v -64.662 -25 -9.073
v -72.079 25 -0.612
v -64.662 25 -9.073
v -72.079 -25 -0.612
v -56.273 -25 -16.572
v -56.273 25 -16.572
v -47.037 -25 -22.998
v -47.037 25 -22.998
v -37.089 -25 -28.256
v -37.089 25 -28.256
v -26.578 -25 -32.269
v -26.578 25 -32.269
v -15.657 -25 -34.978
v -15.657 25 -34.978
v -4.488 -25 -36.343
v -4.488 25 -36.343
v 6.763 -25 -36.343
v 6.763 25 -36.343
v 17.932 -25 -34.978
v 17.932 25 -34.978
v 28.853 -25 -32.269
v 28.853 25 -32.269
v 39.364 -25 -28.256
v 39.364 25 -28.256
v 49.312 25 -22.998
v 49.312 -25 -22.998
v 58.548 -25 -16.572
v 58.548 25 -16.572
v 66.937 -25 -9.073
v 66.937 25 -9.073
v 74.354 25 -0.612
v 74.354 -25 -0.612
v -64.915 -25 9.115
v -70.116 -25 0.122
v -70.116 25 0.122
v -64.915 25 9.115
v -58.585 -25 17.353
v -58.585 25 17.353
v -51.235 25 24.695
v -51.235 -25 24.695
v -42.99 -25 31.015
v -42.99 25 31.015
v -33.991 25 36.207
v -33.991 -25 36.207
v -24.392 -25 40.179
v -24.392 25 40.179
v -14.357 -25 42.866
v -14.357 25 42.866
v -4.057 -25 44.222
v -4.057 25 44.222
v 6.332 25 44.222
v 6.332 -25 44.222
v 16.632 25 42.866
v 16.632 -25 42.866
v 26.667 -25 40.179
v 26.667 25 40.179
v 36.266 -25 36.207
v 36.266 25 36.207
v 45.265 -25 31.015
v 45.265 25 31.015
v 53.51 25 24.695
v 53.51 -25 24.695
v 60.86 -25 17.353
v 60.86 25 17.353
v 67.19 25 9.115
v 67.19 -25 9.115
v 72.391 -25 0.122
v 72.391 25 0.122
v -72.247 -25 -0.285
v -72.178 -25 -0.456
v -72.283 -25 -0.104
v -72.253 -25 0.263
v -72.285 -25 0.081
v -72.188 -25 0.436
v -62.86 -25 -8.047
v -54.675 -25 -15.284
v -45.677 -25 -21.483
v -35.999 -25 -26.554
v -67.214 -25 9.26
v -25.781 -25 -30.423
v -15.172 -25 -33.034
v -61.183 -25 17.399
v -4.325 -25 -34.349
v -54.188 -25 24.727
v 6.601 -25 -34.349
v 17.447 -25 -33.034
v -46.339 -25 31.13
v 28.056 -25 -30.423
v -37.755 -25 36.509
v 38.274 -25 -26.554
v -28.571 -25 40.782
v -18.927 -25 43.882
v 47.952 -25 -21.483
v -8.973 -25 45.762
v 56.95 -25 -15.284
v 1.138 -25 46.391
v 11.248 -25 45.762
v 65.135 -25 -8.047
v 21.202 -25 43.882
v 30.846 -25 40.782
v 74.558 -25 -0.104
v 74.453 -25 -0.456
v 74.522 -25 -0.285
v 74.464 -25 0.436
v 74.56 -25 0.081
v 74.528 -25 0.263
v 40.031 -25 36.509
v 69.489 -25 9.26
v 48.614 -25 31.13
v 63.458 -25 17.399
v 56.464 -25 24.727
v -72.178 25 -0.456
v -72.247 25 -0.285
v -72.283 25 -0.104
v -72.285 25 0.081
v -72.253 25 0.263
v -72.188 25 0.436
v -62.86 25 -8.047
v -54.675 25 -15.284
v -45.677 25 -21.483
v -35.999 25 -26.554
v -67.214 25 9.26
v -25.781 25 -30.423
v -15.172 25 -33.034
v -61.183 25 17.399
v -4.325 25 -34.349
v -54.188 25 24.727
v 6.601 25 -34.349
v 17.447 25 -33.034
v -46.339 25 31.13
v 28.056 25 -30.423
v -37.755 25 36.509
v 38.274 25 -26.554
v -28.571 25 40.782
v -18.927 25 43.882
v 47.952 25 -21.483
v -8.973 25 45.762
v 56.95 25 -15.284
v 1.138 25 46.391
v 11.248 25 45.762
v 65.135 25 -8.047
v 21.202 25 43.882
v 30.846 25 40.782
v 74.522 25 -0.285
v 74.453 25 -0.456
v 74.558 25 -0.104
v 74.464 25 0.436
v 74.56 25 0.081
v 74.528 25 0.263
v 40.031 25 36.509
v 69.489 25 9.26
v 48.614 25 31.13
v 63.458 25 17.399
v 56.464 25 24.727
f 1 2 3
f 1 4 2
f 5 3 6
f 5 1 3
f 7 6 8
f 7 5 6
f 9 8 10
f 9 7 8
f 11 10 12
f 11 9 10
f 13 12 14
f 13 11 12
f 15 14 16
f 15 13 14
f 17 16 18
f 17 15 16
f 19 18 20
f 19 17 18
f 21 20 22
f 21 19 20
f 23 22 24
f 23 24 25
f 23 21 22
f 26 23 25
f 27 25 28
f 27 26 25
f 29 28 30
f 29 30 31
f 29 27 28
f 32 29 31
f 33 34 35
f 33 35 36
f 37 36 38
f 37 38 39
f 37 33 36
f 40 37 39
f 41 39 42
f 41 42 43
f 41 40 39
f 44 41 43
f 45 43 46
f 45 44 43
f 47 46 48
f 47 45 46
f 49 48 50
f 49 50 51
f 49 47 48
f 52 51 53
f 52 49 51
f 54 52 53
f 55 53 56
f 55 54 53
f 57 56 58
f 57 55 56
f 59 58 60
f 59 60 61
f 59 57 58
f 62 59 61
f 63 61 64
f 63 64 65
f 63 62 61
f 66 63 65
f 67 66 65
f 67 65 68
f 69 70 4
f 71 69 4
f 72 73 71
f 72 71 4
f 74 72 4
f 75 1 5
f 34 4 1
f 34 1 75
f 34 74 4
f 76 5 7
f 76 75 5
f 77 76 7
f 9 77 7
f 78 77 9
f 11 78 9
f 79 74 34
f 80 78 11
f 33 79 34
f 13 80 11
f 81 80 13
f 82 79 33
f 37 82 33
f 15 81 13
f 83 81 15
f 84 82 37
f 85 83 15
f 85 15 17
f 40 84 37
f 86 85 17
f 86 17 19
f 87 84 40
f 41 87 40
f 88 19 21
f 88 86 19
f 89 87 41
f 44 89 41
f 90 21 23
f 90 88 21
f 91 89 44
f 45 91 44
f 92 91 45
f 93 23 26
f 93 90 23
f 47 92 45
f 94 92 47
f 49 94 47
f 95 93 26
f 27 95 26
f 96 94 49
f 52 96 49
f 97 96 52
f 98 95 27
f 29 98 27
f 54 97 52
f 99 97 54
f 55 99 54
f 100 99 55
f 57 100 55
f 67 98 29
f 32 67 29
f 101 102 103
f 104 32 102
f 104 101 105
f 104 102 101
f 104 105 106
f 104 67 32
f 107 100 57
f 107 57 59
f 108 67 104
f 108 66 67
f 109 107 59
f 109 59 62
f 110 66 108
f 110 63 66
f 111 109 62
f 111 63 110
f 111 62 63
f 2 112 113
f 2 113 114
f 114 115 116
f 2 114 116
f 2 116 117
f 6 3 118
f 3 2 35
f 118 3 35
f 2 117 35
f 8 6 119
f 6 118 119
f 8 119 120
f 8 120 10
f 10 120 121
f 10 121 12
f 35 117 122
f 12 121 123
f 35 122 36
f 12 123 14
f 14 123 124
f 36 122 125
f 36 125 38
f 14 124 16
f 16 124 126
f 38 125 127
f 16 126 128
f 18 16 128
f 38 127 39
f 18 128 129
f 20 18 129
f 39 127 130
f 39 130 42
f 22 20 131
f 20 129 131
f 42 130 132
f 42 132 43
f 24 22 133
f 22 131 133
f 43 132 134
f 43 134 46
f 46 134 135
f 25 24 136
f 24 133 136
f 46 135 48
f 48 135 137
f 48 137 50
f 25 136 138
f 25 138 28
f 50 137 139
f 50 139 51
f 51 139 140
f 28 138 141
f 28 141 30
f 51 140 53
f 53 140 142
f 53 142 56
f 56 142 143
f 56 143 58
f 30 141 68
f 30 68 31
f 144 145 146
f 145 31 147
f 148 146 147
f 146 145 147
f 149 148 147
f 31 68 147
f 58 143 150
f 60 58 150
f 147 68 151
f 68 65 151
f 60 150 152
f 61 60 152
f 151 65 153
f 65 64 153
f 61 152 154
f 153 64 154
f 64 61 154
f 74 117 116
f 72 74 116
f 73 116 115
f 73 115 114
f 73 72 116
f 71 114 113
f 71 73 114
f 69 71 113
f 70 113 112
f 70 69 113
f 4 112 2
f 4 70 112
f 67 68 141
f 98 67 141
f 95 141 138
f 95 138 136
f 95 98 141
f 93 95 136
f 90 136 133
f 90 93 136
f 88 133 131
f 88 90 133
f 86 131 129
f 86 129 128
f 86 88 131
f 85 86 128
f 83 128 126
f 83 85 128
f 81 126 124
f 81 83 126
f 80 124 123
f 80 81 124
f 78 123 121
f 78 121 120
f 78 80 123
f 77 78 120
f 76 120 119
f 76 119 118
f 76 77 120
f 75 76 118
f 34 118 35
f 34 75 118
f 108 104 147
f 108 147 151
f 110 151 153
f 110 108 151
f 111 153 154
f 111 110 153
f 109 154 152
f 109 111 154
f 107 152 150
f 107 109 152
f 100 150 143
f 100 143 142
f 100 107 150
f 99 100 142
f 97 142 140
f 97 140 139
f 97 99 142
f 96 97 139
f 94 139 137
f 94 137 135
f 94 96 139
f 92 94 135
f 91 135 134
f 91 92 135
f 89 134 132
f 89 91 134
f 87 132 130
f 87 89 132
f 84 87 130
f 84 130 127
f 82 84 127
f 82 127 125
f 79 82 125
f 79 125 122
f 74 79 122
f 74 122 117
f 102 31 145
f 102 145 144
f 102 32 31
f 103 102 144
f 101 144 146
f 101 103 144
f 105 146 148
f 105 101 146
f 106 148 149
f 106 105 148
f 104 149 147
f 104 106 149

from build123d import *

# Parameters (mm, degrees)
F1_DEPTH = 25


with BuildPart() as f1:
    # F0 (on Front) → F1 (new body, symmetric)
    with BuildSketch(Plane.XZ):
        with BuildLine():
            ThreePointArc((74.354294, -0.612335), (74.558297, -0.10376), (74.463656, 0.435969))
            ThreePointArc((74.463656, 0.435969), (1.137581, 46.391442), (-72.188495, 0.435969))
            ThreePointArc((-72.188495, 0.435969), (-72.283136, -0.10376), (-72.079132, -0.612335))
            ThreePointArc((-72.079132, -0.612335), (1.137581, -36.513716), (74.354294, -0.612335))
        make_face()
        with BuildLine():
            ThreePointArc((-70.115532, 0.12209), (1.137581, 44.391442), (72.390694, 0.12209))
            ThreePointArc((72.390694, 0.12209), (1.137581, -34.513716), (-70.115532, 0.12209))
        make_face(mode=Mode.SUBTRACT)
    extrude(amount=F1_DEPTH, both=True)


solid = f1.part
